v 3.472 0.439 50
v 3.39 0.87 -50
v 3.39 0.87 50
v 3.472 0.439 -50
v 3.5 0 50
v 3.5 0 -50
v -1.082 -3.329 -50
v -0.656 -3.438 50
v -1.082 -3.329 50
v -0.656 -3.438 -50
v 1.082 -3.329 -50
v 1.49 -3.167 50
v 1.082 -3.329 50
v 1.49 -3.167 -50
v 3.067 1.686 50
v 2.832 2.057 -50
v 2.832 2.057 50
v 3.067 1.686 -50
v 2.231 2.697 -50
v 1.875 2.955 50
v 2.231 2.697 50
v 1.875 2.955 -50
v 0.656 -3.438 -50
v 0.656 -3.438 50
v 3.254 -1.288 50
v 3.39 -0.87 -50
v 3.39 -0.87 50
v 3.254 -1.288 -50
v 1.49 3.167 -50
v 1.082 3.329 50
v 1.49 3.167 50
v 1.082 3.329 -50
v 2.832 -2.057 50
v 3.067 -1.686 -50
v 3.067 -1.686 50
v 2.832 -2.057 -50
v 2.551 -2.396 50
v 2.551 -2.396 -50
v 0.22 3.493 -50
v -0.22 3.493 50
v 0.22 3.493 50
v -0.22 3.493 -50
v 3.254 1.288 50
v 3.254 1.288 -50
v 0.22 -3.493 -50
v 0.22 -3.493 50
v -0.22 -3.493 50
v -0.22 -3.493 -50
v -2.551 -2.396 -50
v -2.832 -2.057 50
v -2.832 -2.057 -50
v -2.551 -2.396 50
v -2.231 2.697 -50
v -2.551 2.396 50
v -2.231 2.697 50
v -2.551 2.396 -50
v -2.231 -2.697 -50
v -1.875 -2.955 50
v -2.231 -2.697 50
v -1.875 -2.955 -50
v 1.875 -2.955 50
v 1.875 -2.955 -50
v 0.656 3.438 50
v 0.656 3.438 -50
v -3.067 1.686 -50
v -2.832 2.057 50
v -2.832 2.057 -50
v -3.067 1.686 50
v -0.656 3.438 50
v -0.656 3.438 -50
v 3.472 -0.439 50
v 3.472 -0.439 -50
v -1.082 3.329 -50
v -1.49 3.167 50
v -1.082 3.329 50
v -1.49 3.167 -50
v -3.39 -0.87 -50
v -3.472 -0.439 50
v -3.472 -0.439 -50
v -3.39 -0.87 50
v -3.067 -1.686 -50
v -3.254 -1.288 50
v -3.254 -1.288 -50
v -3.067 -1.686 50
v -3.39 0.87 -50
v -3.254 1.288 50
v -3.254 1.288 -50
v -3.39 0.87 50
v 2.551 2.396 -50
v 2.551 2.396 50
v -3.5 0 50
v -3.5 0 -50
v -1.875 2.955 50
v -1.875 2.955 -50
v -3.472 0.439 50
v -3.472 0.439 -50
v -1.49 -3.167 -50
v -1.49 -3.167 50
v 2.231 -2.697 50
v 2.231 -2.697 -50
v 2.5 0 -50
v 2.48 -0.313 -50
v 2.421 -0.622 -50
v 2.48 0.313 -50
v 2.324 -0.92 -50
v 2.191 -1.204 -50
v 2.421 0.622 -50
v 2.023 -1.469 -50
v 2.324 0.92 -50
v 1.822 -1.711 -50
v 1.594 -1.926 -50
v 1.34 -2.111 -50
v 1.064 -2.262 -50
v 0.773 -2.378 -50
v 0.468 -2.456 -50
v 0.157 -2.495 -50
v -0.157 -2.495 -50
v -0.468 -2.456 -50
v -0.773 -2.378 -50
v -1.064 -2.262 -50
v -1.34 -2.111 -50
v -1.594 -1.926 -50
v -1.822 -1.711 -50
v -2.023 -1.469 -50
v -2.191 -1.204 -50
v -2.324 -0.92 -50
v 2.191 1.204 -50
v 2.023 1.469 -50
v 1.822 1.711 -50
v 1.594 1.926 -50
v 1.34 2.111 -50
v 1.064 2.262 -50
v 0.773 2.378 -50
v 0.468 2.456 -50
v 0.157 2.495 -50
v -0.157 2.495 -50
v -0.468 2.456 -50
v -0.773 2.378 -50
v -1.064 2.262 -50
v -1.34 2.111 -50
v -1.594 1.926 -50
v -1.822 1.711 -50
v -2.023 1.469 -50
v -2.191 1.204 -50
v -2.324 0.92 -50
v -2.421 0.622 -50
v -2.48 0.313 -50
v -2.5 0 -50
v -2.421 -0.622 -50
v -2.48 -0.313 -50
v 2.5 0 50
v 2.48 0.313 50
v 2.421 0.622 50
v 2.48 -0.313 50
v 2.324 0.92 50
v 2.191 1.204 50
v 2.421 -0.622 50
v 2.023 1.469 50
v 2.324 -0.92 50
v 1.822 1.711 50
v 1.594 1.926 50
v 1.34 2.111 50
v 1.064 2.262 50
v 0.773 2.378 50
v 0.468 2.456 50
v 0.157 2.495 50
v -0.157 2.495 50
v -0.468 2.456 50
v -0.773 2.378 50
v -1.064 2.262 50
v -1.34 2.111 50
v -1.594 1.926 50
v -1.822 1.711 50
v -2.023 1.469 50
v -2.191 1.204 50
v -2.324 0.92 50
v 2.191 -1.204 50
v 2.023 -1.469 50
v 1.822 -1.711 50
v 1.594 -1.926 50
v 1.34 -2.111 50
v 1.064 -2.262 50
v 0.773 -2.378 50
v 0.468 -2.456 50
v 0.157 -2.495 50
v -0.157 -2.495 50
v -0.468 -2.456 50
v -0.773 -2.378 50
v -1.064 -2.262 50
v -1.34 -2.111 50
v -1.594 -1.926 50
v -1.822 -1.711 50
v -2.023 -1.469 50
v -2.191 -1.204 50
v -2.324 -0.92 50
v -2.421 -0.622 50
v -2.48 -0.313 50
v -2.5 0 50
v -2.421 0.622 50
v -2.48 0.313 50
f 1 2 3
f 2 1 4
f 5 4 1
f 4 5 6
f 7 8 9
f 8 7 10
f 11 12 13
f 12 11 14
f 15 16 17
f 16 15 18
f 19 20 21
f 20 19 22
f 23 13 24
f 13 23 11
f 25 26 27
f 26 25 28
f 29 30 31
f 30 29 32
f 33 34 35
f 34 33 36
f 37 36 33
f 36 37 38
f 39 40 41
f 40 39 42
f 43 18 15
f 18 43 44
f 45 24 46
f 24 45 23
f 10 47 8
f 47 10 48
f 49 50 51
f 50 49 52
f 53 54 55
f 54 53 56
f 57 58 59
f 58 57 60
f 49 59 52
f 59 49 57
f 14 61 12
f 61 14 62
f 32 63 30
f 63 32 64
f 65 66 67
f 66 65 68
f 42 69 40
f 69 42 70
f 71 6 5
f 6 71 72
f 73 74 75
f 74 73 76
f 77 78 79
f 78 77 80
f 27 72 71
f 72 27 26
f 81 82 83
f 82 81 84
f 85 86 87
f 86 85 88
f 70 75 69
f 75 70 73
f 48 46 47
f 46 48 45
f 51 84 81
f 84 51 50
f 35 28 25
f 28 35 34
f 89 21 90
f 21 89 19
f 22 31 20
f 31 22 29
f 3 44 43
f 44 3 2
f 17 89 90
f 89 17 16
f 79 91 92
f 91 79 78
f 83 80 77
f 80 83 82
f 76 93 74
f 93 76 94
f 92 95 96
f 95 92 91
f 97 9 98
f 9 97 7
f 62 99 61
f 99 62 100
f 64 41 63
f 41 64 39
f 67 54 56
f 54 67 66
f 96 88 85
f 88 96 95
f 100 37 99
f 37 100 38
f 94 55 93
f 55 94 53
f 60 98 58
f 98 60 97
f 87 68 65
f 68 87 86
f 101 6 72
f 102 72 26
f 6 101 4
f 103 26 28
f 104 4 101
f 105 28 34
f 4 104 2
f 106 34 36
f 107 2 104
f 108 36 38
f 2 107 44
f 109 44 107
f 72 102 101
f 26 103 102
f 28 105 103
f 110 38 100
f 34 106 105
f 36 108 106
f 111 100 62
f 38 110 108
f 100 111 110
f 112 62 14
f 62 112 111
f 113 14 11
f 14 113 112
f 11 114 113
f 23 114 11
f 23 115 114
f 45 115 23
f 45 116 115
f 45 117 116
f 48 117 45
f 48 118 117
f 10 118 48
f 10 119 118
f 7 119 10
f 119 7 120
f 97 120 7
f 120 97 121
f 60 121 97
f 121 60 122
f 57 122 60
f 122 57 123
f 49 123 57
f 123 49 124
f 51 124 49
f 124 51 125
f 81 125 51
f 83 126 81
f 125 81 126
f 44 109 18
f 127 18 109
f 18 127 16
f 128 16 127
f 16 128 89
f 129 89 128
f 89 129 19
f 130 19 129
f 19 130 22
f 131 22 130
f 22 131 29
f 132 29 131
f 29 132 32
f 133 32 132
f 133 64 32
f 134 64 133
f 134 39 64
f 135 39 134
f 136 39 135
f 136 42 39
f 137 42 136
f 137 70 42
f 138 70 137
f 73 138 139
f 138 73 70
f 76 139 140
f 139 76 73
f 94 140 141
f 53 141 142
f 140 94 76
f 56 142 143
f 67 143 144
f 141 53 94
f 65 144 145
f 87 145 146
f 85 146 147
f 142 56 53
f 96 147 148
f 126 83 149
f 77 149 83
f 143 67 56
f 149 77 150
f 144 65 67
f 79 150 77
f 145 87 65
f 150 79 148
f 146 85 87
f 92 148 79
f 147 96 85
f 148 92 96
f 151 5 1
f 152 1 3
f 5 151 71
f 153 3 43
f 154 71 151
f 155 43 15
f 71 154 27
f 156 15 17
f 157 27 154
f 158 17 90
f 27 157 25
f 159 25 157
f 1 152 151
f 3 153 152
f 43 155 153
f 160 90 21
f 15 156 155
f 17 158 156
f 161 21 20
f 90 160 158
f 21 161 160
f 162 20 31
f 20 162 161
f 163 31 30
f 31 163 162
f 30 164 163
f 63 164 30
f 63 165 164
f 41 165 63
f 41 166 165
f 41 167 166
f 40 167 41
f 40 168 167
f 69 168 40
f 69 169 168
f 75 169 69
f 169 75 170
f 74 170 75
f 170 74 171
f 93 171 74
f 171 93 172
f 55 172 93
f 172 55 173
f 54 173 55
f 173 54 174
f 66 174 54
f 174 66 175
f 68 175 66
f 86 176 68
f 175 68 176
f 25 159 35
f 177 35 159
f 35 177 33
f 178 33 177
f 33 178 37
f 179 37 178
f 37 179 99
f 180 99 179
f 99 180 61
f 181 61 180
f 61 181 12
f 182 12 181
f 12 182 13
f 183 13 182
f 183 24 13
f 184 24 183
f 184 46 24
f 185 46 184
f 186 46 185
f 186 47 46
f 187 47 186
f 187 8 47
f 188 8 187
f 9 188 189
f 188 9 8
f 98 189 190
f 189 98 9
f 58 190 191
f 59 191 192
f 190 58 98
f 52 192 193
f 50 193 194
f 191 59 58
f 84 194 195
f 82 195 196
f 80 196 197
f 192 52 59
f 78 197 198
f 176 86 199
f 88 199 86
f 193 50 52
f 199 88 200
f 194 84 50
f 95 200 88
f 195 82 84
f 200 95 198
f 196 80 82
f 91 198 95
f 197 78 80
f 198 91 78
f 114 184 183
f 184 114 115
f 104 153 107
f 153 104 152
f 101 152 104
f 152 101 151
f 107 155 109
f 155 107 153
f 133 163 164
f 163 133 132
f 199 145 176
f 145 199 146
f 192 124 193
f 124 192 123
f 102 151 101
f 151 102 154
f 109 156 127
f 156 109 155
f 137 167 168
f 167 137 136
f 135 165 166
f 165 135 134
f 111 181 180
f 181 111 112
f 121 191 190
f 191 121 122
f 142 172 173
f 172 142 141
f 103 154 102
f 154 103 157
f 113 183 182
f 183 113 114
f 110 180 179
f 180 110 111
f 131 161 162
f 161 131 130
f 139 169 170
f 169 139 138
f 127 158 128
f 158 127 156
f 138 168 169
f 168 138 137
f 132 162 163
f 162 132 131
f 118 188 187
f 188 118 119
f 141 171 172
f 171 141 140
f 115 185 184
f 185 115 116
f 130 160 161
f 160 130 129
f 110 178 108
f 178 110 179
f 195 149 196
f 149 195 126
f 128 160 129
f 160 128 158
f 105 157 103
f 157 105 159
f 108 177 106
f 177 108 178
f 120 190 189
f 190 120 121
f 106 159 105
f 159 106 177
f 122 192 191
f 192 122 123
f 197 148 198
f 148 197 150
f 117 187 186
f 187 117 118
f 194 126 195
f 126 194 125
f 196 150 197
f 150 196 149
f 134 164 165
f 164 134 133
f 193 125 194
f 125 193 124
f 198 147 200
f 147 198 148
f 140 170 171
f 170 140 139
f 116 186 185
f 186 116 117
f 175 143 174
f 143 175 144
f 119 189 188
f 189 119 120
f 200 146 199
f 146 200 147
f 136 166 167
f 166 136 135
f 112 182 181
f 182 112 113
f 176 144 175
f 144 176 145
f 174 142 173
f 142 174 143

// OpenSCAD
$fn = 50;


difference() {
	union() {
		translate(v = [0, 0, -50.0000000000]) {
			cylinder(h = 100, r = 3.5000000000);
		}
	}
	union() {
		translate(v = [0, 0, -100.0000000000]) {
			cylinder(h = 200, r = 2.5000000000);
		}
	}
}
